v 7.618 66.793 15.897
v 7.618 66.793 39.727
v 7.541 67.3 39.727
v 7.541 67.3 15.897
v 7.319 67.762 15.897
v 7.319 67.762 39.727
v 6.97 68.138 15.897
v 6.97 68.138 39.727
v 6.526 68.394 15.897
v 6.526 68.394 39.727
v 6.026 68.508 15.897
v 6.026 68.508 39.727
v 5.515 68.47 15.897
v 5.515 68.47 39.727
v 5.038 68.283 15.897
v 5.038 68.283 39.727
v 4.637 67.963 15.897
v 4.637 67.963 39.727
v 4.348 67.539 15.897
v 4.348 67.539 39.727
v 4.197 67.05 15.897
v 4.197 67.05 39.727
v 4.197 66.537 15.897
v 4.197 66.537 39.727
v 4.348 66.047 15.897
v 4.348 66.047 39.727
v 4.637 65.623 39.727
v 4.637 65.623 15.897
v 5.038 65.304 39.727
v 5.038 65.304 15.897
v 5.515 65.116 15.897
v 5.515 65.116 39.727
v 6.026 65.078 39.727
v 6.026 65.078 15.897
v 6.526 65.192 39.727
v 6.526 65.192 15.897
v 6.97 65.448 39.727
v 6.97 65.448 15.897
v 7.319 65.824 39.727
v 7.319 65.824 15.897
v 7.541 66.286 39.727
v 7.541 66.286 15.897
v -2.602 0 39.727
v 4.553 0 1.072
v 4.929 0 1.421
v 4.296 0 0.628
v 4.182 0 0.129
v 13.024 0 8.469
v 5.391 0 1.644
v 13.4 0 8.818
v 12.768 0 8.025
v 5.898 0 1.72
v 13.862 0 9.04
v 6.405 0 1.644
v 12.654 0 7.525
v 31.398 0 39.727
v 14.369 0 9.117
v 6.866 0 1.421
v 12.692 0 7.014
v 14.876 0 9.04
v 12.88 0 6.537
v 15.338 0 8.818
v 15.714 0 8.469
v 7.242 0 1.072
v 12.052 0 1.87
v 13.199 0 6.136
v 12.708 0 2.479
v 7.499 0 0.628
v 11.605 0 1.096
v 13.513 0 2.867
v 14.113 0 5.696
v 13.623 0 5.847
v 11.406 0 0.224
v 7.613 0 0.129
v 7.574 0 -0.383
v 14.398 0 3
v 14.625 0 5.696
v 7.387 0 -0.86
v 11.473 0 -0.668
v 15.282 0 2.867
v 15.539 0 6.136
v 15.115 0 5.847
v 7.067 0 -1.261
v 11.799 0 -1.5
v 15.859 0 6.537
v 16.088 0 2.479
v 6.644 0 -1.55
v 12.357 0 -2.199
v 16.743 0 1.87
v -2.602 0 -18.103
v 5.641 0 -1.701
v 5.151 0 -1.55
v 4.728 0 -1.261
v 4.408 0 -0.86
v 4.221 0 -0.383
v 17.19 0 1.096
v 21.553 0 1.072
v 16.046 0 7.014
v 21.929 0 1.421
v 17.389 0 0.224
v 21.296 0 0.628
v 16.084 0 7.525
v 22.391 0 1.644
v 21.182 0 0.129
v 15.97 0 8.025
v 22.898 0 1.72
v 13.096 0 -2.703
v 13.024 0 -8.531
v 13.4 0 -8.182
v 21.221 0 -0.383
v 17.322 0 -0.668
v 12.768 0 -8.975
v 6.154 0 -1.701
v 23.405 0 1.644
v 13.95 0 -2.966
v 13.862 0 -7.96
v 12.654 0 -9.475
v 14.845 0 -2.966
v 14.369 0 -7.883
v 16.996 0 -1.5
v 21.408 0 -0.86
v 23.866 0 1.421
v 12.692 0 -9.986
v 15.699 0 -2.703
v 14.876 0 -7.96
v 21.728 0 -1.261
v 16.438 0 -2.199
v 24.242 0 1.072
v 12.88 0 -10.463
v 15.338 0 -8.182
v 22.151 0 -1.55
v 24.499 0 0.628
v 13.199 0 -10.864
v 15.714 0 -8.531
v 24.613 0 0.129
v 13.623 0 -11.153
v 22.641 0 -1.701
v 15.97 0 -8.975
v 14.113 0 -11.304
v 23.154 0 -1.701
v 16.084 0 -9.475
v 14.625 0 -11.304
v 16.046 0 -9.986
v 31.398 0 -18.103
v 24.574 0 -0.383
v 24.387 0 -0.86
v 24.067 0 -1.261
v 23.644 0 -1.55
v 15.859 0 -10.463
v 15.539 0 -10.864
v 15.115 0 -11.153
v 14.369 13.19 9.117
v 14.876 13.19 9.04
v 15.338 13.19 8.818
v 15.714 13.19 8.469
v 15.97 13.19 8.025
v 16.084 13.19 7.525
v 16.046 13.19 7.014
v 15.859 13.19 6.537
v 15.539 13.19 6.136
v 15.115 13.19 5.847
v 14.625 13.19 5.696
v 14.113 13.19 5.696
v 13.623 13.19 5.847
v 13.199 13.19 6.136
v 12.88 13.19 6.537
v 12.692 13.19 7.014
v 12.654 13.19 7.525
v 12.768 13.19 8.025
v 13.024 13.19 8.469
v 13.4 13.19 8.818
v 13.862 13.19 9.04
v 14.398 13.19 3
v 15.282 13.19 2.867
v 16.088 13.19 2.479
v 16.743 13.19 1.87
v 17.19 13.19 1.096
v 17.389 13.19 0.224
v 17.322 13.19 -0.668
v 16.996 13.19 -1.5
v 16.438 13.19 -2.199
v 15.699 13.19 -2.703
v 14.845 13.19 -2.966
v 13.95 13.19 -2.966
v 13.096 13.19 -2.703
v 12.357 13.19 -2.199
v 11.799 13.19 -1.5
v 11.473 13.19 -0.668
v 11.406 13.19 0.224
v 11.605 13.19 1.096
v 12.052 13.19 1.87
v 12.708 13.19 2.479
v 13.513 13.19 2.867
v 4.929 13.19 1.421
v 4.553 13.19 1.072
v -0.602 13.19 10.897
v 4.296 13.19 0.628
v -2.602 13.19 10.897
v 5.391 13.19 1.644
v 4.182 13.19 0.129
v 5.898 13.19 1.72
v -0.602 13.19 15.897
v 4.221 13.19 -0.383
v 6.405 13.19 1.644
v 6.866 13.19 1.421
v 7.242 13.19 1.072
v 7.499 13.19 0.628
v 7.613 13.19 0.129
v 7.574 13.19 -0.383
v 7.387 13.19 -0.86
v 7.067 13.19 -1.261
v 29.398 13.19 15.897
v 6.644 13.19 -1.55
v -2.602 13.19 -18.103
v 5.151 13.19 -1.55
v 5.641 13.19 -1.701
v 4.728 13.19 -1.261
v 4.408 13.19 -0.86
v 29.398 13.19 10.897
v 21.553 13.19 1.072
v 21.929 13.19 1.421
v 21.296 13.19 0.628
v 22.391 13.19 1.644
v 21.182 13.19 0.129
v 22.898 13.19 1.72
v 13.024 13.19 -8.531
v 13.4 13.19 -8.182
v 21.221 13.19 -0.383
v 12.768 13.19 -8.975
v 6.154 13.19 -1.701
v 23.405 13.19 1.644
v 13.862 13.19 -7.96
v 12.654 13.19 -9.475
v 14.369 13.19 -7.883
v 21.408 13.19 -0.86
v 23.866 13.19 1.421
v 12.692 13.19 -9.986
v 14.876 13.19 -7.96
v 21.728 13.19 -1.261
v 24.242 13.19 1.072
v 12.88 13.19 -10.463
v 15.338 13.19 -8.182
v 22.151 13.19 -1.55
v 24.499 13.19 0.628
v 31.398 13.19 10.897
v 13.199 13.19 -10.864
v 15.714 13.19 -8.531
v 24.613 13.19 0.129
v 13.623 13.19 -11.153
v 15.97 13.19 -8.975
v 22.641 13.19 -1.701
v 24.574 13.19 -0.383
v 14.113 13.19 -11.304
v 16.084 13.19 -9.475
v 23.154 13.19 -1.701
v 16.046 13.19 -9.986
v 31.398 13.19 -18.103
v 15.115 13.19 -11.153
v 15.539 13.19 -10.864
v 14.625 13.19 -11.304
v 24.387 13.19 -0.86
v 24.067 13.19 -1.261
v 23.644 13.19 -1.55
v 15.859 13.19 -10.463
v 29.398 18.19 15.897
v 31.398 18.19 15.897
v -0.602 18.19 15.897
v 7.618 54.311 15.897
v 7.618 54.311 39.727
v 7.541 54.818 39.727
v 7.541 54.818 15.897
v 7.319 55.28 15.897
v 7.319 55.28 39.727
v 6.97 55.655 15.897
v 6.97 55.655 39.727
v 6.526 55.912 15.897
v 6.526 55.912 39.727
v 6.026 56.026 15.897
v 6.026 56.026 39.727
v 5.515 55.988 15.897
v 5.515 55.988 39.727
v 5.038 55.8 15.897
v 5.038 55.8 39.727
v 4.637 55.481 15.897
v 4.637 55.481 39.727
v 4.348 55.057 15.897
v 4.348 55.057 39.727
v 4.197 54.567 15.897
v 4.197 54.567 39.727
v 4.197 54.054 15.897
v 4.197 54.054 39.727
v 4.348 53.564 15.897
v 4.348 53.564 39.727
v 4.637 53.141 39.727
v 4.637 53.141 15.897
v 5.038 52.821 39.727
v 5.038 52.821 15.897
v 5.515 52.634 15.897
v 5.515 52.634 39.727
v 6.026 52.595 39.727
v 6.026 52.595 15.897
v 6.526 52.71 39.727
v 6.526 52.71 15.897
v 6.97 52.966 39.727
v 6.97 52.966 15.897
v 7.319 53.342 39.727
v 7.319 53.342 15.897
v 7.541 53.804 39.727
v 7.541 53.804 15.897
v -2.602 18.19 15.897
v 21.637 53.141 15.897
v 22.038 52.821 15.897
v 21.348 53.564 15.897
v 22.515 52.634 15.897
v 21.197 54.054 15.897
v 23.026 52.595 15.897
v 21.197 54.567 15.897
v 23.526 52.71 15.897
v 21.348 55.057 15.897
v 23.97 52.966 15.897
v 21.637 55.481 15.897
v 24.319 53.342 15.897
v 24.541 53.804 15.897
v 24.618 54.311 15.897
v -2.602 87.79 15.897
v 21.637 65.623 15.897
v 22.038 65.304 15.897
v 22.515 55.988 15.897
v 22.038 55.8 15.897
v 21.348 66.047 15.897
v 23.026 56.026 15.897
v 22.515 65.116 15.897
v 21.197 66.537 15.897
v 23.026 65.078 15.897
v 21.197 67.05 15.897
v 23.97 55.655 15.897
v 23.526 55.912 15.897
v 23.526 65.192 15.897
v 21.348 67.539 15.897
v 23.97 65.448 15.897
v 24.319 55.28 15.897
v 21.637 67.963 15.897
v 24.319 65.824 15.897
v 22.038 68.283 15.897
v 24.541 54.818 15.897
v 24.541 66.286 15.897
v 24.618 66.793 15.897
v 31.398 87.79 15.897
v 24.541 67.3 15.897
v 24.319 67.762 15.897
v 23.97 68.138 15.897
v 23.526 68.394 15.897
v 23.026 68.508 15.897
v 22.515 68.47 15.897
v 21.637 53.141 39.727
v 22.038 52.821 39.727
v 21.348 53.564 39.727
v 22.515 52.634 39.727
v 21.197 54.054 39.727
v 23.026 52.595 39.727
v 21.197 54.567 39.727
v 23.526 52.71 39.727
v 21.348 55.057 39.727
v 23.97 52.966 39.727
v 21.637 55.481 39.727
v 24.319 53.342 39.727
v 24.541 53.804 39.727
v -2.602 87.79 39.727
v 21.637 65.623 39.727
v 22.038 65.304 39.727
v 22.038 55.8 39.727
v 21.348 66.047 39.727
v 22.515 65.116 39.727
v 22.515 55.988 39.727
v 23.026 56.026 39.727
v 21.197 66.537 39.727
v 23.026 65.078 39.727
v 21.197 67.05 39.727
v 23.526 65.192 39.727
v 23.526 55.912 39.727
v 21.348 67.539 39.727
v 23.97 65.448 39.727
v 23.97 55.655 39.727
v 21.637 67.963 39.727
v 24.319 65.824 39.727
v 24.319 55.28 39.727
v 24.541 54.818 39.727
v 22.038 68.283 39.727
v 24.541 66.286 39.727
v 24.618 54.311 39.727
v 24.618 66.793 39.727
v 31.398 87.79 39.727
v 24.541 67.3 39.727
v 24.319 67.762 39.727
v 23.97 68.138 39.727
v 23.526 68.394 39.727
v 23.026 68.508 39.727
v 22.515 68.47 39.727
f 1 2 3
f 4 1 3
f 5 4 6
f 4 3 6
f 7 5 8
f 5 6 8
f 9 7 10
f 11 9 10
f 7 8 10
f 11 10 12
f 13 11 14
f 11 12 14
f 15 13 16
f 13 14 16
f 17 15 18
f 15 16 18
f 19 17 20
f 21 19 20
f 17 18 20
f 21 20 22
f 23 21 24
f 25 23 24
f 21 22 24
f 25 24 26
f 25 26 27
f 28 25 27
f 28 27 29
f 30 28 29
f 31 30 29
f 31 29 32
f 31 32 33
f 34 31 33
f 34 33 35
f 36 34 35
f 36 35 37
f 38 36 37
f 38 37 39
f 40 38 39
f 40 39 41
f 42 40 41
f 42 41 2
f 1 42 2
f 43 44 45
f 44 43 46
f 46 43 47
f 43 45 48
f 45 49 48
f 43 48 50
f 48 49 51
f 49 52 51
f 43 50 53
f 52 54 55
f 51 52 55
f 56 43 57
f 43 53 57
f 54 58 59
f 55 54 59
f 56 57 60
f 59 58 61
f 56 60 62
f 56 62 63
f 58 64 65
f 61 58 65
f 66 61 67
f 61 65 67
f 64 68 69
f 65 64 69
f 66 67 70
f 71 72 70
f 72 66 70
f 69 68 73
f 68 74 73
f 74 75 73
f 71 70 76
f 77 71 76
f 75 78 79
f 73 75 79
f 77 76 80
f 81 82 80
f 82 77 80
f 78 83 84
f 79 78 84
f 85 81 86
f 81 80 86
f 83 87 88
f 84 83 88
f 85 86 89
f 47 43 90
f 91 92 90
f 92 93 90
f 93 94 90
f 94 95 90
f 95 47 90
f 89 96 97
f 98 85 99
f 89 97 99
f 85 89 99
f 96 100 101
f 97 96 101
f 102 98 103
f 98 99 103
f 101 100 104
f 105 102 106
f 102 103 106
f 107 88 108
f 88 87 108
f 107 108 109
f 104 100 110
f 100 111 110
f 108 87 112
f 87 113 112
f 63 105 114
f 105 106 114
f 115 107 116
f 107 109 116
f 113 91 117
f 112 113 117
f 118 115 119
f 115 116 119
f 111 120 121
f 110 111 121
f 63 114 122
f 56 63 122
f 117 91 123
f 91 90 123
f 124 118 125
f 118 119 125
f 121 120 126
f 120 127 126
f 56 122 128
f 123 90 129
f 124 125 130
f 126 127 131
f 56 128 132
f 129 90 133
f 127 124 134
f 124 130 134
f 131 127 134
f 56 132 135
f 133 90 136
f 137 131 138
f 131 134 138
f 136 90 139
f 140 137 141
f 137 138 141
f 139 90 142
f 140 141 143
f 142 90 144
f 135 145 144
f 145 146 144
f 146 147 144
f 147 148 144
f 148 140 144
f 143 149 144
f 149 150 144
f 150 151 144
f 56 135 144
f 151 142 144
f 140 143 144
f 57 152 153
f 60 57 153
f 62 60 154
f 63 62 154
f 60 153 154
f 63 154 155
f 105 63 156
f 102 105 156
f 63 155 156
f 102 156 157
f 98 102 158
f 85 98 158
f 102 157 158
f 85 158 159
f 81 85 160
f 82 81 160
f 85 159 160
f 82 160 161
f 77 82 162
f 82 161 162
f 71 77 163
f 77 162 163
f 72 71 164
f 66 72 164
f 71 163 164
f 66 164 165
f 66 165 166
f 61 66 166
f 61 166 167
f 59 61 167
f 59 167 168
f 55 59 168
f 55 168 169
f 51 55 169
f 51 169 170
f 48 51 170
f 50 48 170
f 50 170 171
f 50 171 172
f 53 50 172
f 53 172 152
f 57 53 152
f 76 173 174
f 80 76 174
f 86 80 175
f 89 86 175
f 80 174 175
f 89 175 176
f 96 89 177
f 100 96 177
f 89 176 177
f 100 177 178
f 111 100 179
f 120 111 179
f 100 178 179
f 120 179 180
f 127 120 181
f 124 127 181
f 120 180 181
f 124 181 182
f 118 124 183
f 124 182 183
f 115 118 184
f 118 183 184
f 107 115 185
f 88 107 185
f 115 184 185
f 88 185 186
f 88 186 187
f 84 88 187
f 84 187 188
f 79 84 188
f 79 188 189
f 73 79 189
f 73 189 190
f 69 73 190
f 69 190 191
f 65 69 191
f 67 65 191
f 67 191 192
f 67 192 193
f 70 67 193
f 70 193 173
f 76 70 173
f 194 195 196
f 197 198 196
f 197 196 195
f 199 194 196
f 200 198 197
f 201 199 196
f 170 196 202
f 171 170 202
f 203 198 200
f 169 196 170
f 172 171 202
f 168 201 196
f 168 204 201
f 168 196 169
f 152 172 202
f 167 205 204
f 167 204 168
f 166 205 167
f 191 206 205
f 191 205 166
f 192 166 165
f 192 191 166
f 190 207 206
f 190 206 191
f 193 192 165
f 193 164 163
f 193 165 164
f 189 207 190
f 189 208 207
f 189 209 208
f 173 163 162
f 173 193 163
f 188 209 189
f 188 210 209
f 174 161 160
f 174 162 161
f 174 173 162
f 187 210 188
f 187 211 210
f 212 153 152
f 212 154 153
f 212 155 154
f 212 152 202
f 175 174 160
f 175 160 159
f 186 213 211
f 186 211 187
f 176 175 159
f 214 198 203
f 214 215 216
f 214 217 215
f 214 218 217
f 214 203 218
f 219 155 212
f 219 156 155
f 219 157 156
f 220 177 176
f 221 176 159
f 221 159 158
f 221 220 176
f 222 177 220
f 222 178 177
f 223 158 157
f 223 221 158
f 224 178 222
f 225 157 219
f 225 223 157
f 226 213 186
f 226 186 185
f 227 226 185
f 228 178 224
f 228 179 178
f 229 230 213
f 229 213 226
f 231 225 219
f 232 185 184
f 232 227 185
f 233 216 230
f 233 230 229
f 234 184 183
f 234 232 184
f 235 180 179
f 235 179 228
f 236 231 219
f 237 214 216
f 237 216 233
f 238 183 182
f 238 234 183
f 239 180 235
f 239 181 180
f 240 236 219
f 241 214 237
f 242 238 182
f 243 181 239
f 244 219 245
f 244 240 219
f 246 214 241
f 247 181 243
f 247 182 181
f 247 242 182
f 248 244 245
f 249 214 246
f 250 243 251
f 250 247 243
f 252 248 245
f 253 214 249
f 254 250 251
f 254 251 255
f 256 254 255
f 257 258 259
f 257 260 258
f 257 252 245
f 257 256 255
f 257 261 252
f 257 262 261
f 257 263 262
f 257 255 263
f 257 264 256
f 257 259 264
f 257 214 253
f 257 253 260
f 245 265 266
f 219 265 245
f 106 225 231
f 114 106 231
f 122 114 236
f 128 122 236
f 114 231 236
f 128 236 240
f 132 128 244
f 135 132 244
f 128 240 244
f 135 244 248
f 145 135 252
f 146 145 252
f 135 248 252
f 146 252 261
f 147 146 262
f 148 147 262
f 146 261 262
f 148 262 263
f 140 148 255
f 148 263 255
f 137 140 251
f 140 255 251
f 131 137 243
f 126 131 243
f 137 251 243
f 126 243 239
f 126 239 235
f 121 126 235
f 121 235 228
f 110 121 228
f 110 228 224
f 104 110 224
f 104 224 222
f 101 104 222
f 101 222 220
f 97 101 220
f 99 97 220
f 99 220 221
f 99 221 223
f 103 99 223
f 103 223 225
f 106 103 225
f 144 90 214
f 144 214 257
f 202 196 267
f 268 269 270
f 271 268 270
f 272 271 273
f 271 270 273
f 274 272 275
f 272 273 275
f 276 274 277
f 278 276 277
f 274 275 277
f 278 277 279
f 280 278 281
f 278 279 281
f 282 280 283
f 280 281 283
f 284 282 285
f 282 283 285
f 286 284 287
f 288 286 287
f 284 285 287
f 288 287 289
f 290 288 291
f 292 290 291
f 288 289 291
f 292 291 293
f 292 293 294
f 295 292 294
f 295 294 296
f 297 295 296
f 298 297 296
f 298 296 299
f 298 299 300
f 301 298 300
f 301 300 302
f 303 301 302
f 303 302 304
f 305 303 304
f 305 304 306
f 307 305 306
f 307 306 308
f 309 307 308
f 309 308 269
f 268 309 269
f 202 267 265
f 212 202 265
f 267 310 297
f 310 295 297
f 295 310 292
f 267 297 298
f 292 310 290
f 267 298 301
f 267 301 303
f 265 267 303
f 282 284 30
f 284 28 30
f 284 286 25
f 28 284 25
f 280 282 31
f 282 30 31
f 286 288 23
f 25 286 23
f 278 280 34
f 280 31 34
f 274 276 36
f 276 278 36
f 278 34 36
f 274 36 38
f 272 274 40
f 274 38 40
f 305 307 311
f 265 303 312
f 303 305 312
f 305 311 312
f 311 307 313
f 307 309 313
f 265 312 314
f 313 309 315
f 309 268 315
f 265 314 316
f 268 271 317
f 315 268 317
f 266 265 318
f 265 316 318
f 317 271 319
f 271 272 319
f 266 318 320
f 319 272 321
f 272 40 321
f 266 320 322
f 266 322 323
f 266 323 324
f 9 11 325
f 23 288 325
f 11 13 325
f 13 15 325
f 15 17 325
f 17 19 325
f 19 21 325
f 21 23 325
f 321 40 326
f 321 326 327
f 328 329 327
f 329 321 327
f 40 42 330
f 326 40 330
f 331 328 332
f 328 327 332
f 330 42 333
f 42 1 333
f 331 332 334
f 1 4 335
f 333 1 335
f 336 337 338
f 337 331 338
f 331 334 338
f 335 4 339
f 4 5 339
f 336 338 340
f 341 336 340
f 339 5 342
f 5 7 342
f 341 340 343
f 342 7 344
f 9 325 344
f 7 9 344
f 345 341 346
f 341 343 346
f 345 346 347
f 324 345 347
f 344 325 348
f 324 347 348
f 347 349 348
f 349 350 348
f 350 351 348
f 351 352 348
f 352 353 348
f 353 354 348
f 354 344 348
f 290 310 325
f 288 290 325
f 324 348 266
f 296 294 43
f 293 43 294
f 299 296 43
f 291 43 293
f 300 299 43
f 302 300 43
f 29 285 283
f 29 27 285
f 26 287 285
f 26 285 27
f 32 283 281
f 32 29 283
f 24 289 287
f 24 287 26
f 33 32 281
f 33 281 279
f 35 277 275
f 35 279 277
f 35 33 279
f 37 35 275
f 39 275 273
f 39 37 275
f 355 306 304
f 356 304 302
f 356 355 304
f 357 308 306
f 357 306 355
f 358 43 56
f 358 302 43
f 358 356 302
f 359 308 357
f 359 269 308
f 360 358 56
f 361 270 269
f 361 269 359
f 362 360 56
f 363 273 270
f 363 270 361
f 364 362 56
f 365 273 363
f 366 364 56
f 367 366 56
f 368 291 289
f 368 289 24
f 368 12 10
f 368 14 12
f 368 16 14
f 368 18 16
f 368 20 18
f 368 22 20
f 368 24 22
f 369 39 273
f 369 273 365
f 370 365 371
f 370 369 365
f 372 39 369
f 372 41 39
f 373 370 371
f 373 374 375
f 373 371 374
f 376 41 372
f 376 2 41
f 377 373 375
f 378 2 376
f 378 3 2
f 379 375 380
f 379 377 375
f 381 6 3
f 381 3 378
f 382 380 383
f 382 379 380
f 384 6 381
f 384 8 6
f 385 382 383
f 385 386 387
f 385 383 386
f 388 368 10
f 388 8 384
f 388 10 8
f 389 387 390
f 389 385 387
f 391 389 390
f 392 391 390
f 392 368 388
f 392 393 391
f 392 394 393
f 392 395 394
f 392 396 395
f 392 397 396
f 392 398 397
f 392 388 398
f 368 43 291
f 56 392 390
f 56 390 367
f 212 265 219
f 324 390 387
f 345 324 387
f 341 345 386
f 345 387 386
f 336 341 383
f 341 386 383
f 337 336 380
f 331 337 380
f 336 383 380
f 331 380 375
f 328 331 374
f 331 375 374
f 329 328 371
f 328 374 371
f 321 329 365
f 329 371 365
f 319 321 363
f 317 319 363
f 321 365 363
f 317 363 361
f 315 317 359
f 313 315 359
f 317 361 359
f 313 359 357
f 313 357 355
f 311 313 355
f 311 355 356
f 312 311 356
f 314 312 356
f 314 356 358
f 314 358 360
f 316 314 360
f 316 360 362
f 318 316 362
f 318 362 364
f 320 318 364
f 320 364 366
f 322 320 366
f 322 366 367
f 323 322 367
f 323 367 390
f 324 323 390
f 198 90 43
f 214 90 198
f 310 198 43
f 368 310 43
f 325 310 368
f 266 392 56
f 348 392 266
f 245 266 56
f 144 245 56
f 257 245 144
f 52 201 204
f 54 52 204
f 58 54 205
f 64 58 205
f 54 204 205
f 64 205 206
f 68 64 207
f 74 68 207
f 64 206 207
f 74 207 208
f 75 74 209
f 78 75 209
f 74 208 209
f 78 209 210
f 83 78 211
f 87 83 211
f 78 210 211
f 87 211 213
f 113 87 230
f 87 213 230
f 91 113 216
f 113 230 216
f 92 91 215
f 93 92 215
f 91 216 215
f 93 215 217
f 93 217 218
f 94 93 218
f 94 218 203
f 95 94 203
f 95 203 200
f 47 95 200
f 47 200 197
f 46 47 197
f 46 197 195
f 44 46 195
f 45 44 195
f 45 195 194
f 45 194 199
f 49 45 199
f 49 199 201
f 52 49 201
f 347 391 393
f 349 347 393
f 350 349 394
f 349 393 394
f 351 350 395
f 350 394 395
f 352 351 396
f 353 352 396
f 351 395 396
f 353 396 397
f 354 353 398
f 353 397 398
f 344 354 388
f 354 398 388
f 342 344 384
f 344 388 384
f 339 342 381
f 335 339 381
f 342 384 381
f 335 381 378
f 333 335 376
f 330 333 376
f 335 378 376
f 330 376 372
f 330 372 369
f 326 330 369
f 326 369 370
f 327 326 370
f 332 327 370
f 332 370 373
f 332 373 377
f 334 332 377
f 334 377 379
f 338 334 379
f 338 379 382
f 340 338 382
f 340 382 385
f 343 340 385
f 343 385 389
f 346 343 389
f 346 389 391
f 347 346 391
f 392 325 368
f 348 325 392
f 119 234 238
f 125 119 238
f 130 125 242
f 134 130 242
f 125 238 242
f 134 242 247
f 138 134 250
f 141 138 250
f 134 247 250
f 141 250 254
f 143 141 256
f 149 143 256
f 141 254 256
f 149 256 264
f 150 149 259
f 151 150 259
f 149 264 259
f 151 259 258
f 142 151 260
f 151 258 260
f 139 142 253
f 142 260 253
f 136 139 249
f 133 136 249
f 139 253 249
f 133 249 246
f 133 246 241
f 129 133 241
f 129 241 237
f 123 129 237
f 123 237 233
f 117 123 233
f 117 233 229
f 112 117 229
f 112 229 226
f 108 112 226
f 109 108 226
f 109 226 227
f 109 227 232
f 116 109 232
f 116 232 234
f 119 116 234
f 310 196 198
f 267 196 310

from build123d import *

# Parameters (mm, degrees)
SKETCH5_W           = 34
SKETCH5_H           = 34
BOSS_EXTRUDE1_DEPTH = 13.19
SKETCH6_W           = 34
SKETCH6_H           = 87.79
BOSS_EXTRUDE2_DEPTH = 23.83
SKETCH7_R           = 3
CUT_EXTRUDE1_DEPTH  = 21.83
SKETCH8_R           = 1.72
CUT_EXTRUDE2_DEPTH  = 31.83
SKETCH9_R           = 1.72
CUT_EXTRUDE3_DEPTH  = 31.83
RIB18_REACH         = 103.535
SKETCH20_WALL_W     = 212.140430626
SKETCH20_WALL_H     = 2
RIB19_REACH         = 103.535
SKETCH21_WALL_W     = 212.140430626
SKETCH21_WALL_H     = 2


with BuildPart() as part:
    # Sketch5 → Boss-Extrude1 (new body)
    with BuildSketch(Plane(origin=(0, 0, 0), x_dir=(1, 0, 0), z_dir=(0, 1, 0))):
        with Locations((14.397550388, 1.103341085)):
            Rectangle(SKETCH5_W, SKETCH5_H)
    extrude(amount=BOSS_EXTRUDE1_DEPTH)

    # Sketch6 → Boss-Extrude2 (add)
    with BuildSketch(Plane.XY.offset(15.896658915)):
        with Locations((14.397550388, 43.895)):
            Rectangle(SKETCH6_W, SKETCH6_H)
    extrude(amount=BOSS_EXTRUDE2_DEPTH)

    # Sketch7 → Cut-Extrude1 (cut)
    with BuildSketch(Plane(origin=(0, 13.19, 0), x_dir=(1, 0, 0), z_dir=(0, 1, 0))):
        with Locations(Location((14.397550388, 0, 0), (0, 0, 270))):
            Circle(SKETCH7_R)
    extrude(amount=-CUT_EXTRUDE1_DEPTH, mode=Mode.SUBTRACT)

    # Sketch8 → Cut-Extrude2 (cut)
    with BuildSketch(Plane.XY.offset(39.726658915)):
        with Locations((5.897550388, 66.793195428)):
            Circle(SKETCH8_R)
        with Locations((22.897550388, 66.793195428)):
            Circle(SKETCH8_R)
        with Locations((5.897550388, 54.310639336)):
            Circle(SKETCH8_R)
        with Locations((22.897550388, 54.310639336)):
            Circle(SKETCH8_R)
    extrude(amount=-CUT_EXTRUDE2_DEPTH, mode=Mode.SUBTRACT)

    # Sketch9 → Cut-Extrude3 (cut)
    with BuildSketch(Plane(origin=(0, 13.19, 0), x_dir=(1, 0, 0), z_dir=(0, 1, 0))):
        with Locations(Location((22.897550388, 0, 0), (0, 0, 270))):
            Circle(SKETCH9_R)
        with Locations(Location((14.369066497, 9.603341085, 0), (0, 0, 270))):
            Circle(SKETCH9_R)
        with Locations(Location((14.369066497, -7.396658915, 0), (0, 0, 270))):
            Circle(SKETCH9_R)
        with Locations(Location((5.897550388, 0, 0), (0, 0, 270))):
            Circle(SKETCH9_R)
    extrude(amount=-CUT_EXTRUDE3_DEPTH, mode=Mode.SUBTRACT)

    # Sketch20 wall → Rib18 (add, up to next)
    with BuildSketch(Plane(origin=(-0.602449612, 15.69, 13.396658915), x_dir=(0, 0.707106781187, 0.707106781187), z_dir=(0, 0.707106781187, -0.707106781187)), mode=Mode.PRIVATE) as rib18_sk1:
        with Locations((0, -1)):
            Rectangle(SKETCH20_WALL_W, SKETCH20_WALL_H)
    rib18_tool1 = extrude(rib18_sk1.sketch, amount=-RIB18_REACH, mode=Mode.PRIVATE) - part.part
    add(rib18_tool1.solids().sort_by_distance((-0.602449612, 15.69, 13.396658915))[0])

    # Sketch21 wall → Rib19 (add, up to next)
    with BuildSketch(Plane(origin=(29.397550388, 15.69, 13.396658915), x_dir=(0, -0.707106781187, -0.707106781187), z_dir=(0, 0.707106781187, -0.707106781187)), mode=Mode.PRIVATE) as rib19_sk1:
        with Locations((0, -1)):
            Rectangle(SKETCH21_WALL_W, SKETCH21_WALL_H)
    rib19_tool1 = extrude(rib19_sk1.sketch, amount=-RIB19_REACH, mode=Mode.PRIVATE) - part.part
    add(rib19_tool1.solids().sort_by_distance((29.397550388, 15.69, 13.396658915))[0])


solid = part.part
